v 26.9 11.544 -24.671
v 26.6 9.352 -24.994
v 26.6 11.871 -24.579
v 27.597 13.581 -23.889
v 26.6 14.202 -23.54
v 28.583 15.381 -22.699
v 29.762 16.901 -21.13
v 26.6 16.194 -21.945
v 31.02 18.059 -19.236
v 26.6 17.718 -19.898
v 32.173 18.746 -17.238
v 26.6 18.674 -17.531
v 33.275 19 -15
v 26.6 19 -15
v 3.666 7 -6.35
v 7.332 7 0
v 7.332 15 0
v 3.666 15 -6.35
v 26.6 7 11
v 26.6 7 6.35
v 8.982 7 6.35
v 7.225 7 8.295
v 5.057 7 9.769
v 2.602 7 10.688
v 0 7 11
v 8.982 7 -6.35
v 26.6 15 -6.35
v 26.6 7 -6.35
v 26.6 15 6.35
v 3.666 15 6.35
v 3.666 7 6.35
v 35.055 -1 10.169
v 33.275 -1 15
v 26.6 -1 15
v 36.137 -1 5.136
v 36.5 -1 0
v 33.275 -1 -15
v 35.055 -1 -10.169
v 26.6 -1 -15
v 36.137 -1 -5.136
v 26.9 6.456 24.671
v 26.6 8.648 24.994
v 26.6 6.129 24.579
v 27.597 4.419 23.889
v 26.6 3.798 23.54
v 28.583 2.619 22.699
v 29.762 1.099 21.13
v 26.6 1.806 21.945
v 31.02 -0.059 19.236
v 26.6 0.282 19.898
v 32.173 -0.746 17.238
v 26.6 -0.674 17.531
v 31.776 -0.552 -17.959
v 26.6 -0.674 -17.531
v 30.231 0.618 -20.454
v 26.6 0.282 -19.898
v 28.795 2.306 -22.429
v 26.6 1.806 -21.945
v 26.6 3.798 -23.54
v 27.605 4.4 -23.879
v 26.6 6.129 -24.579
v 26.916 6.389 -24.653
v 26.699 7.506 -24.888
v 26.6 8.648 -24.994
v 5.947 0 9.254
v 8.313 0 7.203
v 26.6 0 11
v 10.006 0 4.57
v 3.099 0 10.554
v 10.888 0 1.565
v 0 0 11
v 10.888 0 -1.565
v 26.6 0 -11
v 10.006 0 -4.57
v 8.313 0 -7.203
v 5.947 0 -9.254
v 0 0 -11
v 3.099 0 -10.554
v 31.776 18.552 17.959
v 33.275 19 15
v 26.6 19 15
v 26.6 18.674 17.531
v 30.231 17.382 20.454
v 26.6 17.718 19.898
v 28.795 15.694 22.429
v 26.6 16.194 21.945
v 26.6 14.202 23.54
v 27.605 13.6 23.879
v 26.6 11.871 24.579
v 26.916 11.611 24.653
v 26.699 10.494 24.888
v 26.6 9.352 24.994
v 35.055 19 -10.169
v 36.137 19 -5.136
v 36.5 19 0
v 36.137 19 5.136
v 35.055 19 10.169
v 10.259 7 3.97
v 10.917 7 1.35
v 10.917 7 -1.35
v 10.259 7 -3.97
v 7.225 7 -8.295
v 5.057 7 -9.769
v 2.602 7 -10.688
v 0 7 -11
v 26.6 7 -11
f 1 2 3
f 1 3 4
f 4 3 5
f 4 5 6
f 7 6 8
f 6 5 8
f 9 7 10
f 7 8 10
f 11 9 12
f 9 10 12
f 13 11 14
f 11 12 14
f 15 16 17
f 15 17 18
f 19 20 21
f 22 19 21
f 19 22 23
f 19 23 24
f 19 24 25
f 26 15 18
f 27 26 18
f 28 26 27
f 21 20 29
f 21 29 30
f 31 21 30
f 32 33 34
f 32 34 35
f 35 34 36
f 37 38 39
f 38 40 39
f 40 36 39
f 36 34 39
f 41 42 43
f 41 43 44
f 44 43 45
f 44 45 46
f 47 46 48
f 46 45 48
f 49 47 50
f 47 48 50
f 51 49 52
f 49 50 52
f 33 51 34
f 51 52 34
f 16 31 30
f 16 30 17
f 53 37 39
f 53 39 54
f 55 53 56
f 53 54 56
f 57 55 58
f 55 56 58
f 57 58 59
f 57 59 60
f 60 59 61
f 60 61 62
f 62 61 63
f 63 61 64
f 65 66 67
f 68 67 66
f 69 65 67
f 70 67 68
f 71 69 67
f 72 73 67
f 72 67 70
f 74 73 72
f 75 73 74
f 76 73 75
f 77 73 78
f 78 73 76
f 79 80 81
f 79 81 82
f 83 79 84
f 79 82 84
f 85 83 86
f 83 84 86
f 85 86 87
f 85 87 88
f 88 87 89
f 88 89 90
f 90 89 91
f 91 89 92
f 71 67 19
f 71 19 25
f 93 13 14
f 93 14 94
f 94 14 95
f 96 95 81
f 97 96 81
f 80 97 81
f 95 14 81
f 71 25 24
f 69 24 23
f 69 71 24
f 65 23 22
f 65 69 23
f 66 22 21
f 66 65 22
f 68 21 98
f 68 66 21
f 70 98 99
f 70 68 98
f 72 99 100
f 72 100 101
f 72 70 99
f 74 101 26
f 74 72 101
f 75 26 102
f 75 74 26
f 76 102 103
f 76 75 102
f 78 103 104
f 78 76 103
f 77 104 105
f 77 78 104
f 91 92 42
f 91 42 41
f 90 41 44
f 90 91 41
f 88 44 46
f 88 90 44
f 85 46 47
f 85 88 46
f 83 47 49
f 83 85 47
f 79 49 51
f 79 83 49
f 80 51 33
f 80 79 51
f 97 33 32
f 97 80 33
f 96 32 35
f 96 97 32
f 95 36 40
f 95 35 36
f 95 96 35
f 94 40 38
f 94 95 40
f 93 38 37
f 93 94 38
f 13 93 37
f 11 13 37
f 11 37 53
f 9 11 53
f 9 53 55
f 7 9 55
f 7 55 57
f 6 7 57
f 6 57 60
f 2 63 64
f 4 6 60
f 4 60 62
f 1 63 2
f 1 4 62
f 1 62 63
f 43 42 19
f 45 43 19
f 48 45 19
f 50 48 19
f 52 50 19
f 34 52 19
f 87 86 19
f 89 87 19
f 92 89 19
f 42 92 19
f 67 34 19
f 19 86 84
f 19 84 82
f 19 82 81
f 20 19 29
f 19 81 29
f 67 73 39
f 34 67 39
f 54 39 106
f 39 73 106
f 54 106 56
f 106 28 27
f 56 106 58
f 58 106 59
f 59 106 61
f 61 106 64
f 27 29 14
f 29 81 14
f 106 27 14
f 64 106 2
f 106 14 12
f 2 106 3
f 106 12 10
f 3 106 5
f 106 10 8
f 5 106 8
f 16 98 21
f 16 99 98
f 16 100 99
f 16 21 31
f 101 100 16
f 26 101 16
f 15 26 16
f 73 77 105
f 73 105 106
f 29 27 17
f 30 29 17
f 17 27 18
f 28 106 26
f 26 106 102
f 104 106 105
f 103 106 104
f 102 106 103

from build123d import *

# Parameters (mm, degrees)
BOSS_EXTRUDE1_DEPTH = 7
BOSS_EXTRUDE2_DEPTH = 8
BOSS_EXTRUDE3_DEPTH = 12
CUT_EXTRUDE1_REACH  = 52.149
SKETCH4_R           = 50
SKETCH4_R_2         = 36.5


with BuildPart() as part:
    # Sketch1 → Boss-Extrude1 (new body)
    with BuildSketch(Plane(origin=(0, 0, 0), x_dir=(1, 0, 0), z_dir=(0, 1, 0))):
        with BuildLine():
            Line((0, 11), (34.803017111, 11))
            ThreePointArc((34.803017111, 11), (36.5, 0), (34.803017111, -11))
            Line((34.803017111, -11), (0, -11))
            ThreePointArc((0, -11), (11, 0), (0, 11))
        make_face()
    extrude(amount=BOSS_EXTRUDE1_DEPTH)

    # Sketch2 → Boss-Extrude2 (add)
    with BuildSketch(Plane(origin=(0, 7, 0), x_dir=(1, 0, 0), z_dir=(0, 1, 0))):
        with BuildLine():
            Line((3.666174209, 6.35), (35.943392995, 6.35))
            ThreePointArc((35.943392995, 6.35), (36.5, 0), (35.943392995, -6.35))
            Line((35.943392995, -6.35), (3.666174209, -6.35))
            Line((3.666174209, -6.35), (7.332348419, 0))
            Line((7.332348419, 0), (3.666174209, 6.35))
        make_face()
    extrude(amount=BOSS_EXTRUDE2_DEPTH)

    # Sketch3 → Boss-Extrude3 (add)
    with BuildSketch(Plane(origin=(26.6, 0, 0), x_dir=(0, 0, -1), z_dir=(1, 0, 0))):
        with BuildLine():
            Line((-15, -1), (15, -1))
            ThreePointArc((15, -1), (25, 9), (15, 19))
            Line((15, 19), (-15, 19))
            ThreePointArc((-15, 19), (-25, 9), (-15, -1))
        make_face()
    extrude(amount=BOSS_EXTRUDE3_DEPTH)

    # Sketch4 → Cut-Extrude1 (cut, up to next)
    with BuildSketch(Plane(origin=(0, 19, 0), x_dir=(1, 0, 0), z_dir=(0, 1, 0)), mode=Mode.PRIVATE) as cut_extrude1_sk1:
        Circle(SKETCH4_R)
        Circle(SKETCH4_R_2, mode=Mode.SUBTRACT)
    cut_extrude1_tool1 = extrude(cut_extrude1_sk1.sketch, amount=-CUT_EXTRUDE1_REACH, mode=Mode.PRIVATE) & part.part
    add(cut_extrude1_tool1.solids().sort_by_distance((-48.585786, 19, 0))[0], mode=Mode.SUBTRACT)


solid = part.part
